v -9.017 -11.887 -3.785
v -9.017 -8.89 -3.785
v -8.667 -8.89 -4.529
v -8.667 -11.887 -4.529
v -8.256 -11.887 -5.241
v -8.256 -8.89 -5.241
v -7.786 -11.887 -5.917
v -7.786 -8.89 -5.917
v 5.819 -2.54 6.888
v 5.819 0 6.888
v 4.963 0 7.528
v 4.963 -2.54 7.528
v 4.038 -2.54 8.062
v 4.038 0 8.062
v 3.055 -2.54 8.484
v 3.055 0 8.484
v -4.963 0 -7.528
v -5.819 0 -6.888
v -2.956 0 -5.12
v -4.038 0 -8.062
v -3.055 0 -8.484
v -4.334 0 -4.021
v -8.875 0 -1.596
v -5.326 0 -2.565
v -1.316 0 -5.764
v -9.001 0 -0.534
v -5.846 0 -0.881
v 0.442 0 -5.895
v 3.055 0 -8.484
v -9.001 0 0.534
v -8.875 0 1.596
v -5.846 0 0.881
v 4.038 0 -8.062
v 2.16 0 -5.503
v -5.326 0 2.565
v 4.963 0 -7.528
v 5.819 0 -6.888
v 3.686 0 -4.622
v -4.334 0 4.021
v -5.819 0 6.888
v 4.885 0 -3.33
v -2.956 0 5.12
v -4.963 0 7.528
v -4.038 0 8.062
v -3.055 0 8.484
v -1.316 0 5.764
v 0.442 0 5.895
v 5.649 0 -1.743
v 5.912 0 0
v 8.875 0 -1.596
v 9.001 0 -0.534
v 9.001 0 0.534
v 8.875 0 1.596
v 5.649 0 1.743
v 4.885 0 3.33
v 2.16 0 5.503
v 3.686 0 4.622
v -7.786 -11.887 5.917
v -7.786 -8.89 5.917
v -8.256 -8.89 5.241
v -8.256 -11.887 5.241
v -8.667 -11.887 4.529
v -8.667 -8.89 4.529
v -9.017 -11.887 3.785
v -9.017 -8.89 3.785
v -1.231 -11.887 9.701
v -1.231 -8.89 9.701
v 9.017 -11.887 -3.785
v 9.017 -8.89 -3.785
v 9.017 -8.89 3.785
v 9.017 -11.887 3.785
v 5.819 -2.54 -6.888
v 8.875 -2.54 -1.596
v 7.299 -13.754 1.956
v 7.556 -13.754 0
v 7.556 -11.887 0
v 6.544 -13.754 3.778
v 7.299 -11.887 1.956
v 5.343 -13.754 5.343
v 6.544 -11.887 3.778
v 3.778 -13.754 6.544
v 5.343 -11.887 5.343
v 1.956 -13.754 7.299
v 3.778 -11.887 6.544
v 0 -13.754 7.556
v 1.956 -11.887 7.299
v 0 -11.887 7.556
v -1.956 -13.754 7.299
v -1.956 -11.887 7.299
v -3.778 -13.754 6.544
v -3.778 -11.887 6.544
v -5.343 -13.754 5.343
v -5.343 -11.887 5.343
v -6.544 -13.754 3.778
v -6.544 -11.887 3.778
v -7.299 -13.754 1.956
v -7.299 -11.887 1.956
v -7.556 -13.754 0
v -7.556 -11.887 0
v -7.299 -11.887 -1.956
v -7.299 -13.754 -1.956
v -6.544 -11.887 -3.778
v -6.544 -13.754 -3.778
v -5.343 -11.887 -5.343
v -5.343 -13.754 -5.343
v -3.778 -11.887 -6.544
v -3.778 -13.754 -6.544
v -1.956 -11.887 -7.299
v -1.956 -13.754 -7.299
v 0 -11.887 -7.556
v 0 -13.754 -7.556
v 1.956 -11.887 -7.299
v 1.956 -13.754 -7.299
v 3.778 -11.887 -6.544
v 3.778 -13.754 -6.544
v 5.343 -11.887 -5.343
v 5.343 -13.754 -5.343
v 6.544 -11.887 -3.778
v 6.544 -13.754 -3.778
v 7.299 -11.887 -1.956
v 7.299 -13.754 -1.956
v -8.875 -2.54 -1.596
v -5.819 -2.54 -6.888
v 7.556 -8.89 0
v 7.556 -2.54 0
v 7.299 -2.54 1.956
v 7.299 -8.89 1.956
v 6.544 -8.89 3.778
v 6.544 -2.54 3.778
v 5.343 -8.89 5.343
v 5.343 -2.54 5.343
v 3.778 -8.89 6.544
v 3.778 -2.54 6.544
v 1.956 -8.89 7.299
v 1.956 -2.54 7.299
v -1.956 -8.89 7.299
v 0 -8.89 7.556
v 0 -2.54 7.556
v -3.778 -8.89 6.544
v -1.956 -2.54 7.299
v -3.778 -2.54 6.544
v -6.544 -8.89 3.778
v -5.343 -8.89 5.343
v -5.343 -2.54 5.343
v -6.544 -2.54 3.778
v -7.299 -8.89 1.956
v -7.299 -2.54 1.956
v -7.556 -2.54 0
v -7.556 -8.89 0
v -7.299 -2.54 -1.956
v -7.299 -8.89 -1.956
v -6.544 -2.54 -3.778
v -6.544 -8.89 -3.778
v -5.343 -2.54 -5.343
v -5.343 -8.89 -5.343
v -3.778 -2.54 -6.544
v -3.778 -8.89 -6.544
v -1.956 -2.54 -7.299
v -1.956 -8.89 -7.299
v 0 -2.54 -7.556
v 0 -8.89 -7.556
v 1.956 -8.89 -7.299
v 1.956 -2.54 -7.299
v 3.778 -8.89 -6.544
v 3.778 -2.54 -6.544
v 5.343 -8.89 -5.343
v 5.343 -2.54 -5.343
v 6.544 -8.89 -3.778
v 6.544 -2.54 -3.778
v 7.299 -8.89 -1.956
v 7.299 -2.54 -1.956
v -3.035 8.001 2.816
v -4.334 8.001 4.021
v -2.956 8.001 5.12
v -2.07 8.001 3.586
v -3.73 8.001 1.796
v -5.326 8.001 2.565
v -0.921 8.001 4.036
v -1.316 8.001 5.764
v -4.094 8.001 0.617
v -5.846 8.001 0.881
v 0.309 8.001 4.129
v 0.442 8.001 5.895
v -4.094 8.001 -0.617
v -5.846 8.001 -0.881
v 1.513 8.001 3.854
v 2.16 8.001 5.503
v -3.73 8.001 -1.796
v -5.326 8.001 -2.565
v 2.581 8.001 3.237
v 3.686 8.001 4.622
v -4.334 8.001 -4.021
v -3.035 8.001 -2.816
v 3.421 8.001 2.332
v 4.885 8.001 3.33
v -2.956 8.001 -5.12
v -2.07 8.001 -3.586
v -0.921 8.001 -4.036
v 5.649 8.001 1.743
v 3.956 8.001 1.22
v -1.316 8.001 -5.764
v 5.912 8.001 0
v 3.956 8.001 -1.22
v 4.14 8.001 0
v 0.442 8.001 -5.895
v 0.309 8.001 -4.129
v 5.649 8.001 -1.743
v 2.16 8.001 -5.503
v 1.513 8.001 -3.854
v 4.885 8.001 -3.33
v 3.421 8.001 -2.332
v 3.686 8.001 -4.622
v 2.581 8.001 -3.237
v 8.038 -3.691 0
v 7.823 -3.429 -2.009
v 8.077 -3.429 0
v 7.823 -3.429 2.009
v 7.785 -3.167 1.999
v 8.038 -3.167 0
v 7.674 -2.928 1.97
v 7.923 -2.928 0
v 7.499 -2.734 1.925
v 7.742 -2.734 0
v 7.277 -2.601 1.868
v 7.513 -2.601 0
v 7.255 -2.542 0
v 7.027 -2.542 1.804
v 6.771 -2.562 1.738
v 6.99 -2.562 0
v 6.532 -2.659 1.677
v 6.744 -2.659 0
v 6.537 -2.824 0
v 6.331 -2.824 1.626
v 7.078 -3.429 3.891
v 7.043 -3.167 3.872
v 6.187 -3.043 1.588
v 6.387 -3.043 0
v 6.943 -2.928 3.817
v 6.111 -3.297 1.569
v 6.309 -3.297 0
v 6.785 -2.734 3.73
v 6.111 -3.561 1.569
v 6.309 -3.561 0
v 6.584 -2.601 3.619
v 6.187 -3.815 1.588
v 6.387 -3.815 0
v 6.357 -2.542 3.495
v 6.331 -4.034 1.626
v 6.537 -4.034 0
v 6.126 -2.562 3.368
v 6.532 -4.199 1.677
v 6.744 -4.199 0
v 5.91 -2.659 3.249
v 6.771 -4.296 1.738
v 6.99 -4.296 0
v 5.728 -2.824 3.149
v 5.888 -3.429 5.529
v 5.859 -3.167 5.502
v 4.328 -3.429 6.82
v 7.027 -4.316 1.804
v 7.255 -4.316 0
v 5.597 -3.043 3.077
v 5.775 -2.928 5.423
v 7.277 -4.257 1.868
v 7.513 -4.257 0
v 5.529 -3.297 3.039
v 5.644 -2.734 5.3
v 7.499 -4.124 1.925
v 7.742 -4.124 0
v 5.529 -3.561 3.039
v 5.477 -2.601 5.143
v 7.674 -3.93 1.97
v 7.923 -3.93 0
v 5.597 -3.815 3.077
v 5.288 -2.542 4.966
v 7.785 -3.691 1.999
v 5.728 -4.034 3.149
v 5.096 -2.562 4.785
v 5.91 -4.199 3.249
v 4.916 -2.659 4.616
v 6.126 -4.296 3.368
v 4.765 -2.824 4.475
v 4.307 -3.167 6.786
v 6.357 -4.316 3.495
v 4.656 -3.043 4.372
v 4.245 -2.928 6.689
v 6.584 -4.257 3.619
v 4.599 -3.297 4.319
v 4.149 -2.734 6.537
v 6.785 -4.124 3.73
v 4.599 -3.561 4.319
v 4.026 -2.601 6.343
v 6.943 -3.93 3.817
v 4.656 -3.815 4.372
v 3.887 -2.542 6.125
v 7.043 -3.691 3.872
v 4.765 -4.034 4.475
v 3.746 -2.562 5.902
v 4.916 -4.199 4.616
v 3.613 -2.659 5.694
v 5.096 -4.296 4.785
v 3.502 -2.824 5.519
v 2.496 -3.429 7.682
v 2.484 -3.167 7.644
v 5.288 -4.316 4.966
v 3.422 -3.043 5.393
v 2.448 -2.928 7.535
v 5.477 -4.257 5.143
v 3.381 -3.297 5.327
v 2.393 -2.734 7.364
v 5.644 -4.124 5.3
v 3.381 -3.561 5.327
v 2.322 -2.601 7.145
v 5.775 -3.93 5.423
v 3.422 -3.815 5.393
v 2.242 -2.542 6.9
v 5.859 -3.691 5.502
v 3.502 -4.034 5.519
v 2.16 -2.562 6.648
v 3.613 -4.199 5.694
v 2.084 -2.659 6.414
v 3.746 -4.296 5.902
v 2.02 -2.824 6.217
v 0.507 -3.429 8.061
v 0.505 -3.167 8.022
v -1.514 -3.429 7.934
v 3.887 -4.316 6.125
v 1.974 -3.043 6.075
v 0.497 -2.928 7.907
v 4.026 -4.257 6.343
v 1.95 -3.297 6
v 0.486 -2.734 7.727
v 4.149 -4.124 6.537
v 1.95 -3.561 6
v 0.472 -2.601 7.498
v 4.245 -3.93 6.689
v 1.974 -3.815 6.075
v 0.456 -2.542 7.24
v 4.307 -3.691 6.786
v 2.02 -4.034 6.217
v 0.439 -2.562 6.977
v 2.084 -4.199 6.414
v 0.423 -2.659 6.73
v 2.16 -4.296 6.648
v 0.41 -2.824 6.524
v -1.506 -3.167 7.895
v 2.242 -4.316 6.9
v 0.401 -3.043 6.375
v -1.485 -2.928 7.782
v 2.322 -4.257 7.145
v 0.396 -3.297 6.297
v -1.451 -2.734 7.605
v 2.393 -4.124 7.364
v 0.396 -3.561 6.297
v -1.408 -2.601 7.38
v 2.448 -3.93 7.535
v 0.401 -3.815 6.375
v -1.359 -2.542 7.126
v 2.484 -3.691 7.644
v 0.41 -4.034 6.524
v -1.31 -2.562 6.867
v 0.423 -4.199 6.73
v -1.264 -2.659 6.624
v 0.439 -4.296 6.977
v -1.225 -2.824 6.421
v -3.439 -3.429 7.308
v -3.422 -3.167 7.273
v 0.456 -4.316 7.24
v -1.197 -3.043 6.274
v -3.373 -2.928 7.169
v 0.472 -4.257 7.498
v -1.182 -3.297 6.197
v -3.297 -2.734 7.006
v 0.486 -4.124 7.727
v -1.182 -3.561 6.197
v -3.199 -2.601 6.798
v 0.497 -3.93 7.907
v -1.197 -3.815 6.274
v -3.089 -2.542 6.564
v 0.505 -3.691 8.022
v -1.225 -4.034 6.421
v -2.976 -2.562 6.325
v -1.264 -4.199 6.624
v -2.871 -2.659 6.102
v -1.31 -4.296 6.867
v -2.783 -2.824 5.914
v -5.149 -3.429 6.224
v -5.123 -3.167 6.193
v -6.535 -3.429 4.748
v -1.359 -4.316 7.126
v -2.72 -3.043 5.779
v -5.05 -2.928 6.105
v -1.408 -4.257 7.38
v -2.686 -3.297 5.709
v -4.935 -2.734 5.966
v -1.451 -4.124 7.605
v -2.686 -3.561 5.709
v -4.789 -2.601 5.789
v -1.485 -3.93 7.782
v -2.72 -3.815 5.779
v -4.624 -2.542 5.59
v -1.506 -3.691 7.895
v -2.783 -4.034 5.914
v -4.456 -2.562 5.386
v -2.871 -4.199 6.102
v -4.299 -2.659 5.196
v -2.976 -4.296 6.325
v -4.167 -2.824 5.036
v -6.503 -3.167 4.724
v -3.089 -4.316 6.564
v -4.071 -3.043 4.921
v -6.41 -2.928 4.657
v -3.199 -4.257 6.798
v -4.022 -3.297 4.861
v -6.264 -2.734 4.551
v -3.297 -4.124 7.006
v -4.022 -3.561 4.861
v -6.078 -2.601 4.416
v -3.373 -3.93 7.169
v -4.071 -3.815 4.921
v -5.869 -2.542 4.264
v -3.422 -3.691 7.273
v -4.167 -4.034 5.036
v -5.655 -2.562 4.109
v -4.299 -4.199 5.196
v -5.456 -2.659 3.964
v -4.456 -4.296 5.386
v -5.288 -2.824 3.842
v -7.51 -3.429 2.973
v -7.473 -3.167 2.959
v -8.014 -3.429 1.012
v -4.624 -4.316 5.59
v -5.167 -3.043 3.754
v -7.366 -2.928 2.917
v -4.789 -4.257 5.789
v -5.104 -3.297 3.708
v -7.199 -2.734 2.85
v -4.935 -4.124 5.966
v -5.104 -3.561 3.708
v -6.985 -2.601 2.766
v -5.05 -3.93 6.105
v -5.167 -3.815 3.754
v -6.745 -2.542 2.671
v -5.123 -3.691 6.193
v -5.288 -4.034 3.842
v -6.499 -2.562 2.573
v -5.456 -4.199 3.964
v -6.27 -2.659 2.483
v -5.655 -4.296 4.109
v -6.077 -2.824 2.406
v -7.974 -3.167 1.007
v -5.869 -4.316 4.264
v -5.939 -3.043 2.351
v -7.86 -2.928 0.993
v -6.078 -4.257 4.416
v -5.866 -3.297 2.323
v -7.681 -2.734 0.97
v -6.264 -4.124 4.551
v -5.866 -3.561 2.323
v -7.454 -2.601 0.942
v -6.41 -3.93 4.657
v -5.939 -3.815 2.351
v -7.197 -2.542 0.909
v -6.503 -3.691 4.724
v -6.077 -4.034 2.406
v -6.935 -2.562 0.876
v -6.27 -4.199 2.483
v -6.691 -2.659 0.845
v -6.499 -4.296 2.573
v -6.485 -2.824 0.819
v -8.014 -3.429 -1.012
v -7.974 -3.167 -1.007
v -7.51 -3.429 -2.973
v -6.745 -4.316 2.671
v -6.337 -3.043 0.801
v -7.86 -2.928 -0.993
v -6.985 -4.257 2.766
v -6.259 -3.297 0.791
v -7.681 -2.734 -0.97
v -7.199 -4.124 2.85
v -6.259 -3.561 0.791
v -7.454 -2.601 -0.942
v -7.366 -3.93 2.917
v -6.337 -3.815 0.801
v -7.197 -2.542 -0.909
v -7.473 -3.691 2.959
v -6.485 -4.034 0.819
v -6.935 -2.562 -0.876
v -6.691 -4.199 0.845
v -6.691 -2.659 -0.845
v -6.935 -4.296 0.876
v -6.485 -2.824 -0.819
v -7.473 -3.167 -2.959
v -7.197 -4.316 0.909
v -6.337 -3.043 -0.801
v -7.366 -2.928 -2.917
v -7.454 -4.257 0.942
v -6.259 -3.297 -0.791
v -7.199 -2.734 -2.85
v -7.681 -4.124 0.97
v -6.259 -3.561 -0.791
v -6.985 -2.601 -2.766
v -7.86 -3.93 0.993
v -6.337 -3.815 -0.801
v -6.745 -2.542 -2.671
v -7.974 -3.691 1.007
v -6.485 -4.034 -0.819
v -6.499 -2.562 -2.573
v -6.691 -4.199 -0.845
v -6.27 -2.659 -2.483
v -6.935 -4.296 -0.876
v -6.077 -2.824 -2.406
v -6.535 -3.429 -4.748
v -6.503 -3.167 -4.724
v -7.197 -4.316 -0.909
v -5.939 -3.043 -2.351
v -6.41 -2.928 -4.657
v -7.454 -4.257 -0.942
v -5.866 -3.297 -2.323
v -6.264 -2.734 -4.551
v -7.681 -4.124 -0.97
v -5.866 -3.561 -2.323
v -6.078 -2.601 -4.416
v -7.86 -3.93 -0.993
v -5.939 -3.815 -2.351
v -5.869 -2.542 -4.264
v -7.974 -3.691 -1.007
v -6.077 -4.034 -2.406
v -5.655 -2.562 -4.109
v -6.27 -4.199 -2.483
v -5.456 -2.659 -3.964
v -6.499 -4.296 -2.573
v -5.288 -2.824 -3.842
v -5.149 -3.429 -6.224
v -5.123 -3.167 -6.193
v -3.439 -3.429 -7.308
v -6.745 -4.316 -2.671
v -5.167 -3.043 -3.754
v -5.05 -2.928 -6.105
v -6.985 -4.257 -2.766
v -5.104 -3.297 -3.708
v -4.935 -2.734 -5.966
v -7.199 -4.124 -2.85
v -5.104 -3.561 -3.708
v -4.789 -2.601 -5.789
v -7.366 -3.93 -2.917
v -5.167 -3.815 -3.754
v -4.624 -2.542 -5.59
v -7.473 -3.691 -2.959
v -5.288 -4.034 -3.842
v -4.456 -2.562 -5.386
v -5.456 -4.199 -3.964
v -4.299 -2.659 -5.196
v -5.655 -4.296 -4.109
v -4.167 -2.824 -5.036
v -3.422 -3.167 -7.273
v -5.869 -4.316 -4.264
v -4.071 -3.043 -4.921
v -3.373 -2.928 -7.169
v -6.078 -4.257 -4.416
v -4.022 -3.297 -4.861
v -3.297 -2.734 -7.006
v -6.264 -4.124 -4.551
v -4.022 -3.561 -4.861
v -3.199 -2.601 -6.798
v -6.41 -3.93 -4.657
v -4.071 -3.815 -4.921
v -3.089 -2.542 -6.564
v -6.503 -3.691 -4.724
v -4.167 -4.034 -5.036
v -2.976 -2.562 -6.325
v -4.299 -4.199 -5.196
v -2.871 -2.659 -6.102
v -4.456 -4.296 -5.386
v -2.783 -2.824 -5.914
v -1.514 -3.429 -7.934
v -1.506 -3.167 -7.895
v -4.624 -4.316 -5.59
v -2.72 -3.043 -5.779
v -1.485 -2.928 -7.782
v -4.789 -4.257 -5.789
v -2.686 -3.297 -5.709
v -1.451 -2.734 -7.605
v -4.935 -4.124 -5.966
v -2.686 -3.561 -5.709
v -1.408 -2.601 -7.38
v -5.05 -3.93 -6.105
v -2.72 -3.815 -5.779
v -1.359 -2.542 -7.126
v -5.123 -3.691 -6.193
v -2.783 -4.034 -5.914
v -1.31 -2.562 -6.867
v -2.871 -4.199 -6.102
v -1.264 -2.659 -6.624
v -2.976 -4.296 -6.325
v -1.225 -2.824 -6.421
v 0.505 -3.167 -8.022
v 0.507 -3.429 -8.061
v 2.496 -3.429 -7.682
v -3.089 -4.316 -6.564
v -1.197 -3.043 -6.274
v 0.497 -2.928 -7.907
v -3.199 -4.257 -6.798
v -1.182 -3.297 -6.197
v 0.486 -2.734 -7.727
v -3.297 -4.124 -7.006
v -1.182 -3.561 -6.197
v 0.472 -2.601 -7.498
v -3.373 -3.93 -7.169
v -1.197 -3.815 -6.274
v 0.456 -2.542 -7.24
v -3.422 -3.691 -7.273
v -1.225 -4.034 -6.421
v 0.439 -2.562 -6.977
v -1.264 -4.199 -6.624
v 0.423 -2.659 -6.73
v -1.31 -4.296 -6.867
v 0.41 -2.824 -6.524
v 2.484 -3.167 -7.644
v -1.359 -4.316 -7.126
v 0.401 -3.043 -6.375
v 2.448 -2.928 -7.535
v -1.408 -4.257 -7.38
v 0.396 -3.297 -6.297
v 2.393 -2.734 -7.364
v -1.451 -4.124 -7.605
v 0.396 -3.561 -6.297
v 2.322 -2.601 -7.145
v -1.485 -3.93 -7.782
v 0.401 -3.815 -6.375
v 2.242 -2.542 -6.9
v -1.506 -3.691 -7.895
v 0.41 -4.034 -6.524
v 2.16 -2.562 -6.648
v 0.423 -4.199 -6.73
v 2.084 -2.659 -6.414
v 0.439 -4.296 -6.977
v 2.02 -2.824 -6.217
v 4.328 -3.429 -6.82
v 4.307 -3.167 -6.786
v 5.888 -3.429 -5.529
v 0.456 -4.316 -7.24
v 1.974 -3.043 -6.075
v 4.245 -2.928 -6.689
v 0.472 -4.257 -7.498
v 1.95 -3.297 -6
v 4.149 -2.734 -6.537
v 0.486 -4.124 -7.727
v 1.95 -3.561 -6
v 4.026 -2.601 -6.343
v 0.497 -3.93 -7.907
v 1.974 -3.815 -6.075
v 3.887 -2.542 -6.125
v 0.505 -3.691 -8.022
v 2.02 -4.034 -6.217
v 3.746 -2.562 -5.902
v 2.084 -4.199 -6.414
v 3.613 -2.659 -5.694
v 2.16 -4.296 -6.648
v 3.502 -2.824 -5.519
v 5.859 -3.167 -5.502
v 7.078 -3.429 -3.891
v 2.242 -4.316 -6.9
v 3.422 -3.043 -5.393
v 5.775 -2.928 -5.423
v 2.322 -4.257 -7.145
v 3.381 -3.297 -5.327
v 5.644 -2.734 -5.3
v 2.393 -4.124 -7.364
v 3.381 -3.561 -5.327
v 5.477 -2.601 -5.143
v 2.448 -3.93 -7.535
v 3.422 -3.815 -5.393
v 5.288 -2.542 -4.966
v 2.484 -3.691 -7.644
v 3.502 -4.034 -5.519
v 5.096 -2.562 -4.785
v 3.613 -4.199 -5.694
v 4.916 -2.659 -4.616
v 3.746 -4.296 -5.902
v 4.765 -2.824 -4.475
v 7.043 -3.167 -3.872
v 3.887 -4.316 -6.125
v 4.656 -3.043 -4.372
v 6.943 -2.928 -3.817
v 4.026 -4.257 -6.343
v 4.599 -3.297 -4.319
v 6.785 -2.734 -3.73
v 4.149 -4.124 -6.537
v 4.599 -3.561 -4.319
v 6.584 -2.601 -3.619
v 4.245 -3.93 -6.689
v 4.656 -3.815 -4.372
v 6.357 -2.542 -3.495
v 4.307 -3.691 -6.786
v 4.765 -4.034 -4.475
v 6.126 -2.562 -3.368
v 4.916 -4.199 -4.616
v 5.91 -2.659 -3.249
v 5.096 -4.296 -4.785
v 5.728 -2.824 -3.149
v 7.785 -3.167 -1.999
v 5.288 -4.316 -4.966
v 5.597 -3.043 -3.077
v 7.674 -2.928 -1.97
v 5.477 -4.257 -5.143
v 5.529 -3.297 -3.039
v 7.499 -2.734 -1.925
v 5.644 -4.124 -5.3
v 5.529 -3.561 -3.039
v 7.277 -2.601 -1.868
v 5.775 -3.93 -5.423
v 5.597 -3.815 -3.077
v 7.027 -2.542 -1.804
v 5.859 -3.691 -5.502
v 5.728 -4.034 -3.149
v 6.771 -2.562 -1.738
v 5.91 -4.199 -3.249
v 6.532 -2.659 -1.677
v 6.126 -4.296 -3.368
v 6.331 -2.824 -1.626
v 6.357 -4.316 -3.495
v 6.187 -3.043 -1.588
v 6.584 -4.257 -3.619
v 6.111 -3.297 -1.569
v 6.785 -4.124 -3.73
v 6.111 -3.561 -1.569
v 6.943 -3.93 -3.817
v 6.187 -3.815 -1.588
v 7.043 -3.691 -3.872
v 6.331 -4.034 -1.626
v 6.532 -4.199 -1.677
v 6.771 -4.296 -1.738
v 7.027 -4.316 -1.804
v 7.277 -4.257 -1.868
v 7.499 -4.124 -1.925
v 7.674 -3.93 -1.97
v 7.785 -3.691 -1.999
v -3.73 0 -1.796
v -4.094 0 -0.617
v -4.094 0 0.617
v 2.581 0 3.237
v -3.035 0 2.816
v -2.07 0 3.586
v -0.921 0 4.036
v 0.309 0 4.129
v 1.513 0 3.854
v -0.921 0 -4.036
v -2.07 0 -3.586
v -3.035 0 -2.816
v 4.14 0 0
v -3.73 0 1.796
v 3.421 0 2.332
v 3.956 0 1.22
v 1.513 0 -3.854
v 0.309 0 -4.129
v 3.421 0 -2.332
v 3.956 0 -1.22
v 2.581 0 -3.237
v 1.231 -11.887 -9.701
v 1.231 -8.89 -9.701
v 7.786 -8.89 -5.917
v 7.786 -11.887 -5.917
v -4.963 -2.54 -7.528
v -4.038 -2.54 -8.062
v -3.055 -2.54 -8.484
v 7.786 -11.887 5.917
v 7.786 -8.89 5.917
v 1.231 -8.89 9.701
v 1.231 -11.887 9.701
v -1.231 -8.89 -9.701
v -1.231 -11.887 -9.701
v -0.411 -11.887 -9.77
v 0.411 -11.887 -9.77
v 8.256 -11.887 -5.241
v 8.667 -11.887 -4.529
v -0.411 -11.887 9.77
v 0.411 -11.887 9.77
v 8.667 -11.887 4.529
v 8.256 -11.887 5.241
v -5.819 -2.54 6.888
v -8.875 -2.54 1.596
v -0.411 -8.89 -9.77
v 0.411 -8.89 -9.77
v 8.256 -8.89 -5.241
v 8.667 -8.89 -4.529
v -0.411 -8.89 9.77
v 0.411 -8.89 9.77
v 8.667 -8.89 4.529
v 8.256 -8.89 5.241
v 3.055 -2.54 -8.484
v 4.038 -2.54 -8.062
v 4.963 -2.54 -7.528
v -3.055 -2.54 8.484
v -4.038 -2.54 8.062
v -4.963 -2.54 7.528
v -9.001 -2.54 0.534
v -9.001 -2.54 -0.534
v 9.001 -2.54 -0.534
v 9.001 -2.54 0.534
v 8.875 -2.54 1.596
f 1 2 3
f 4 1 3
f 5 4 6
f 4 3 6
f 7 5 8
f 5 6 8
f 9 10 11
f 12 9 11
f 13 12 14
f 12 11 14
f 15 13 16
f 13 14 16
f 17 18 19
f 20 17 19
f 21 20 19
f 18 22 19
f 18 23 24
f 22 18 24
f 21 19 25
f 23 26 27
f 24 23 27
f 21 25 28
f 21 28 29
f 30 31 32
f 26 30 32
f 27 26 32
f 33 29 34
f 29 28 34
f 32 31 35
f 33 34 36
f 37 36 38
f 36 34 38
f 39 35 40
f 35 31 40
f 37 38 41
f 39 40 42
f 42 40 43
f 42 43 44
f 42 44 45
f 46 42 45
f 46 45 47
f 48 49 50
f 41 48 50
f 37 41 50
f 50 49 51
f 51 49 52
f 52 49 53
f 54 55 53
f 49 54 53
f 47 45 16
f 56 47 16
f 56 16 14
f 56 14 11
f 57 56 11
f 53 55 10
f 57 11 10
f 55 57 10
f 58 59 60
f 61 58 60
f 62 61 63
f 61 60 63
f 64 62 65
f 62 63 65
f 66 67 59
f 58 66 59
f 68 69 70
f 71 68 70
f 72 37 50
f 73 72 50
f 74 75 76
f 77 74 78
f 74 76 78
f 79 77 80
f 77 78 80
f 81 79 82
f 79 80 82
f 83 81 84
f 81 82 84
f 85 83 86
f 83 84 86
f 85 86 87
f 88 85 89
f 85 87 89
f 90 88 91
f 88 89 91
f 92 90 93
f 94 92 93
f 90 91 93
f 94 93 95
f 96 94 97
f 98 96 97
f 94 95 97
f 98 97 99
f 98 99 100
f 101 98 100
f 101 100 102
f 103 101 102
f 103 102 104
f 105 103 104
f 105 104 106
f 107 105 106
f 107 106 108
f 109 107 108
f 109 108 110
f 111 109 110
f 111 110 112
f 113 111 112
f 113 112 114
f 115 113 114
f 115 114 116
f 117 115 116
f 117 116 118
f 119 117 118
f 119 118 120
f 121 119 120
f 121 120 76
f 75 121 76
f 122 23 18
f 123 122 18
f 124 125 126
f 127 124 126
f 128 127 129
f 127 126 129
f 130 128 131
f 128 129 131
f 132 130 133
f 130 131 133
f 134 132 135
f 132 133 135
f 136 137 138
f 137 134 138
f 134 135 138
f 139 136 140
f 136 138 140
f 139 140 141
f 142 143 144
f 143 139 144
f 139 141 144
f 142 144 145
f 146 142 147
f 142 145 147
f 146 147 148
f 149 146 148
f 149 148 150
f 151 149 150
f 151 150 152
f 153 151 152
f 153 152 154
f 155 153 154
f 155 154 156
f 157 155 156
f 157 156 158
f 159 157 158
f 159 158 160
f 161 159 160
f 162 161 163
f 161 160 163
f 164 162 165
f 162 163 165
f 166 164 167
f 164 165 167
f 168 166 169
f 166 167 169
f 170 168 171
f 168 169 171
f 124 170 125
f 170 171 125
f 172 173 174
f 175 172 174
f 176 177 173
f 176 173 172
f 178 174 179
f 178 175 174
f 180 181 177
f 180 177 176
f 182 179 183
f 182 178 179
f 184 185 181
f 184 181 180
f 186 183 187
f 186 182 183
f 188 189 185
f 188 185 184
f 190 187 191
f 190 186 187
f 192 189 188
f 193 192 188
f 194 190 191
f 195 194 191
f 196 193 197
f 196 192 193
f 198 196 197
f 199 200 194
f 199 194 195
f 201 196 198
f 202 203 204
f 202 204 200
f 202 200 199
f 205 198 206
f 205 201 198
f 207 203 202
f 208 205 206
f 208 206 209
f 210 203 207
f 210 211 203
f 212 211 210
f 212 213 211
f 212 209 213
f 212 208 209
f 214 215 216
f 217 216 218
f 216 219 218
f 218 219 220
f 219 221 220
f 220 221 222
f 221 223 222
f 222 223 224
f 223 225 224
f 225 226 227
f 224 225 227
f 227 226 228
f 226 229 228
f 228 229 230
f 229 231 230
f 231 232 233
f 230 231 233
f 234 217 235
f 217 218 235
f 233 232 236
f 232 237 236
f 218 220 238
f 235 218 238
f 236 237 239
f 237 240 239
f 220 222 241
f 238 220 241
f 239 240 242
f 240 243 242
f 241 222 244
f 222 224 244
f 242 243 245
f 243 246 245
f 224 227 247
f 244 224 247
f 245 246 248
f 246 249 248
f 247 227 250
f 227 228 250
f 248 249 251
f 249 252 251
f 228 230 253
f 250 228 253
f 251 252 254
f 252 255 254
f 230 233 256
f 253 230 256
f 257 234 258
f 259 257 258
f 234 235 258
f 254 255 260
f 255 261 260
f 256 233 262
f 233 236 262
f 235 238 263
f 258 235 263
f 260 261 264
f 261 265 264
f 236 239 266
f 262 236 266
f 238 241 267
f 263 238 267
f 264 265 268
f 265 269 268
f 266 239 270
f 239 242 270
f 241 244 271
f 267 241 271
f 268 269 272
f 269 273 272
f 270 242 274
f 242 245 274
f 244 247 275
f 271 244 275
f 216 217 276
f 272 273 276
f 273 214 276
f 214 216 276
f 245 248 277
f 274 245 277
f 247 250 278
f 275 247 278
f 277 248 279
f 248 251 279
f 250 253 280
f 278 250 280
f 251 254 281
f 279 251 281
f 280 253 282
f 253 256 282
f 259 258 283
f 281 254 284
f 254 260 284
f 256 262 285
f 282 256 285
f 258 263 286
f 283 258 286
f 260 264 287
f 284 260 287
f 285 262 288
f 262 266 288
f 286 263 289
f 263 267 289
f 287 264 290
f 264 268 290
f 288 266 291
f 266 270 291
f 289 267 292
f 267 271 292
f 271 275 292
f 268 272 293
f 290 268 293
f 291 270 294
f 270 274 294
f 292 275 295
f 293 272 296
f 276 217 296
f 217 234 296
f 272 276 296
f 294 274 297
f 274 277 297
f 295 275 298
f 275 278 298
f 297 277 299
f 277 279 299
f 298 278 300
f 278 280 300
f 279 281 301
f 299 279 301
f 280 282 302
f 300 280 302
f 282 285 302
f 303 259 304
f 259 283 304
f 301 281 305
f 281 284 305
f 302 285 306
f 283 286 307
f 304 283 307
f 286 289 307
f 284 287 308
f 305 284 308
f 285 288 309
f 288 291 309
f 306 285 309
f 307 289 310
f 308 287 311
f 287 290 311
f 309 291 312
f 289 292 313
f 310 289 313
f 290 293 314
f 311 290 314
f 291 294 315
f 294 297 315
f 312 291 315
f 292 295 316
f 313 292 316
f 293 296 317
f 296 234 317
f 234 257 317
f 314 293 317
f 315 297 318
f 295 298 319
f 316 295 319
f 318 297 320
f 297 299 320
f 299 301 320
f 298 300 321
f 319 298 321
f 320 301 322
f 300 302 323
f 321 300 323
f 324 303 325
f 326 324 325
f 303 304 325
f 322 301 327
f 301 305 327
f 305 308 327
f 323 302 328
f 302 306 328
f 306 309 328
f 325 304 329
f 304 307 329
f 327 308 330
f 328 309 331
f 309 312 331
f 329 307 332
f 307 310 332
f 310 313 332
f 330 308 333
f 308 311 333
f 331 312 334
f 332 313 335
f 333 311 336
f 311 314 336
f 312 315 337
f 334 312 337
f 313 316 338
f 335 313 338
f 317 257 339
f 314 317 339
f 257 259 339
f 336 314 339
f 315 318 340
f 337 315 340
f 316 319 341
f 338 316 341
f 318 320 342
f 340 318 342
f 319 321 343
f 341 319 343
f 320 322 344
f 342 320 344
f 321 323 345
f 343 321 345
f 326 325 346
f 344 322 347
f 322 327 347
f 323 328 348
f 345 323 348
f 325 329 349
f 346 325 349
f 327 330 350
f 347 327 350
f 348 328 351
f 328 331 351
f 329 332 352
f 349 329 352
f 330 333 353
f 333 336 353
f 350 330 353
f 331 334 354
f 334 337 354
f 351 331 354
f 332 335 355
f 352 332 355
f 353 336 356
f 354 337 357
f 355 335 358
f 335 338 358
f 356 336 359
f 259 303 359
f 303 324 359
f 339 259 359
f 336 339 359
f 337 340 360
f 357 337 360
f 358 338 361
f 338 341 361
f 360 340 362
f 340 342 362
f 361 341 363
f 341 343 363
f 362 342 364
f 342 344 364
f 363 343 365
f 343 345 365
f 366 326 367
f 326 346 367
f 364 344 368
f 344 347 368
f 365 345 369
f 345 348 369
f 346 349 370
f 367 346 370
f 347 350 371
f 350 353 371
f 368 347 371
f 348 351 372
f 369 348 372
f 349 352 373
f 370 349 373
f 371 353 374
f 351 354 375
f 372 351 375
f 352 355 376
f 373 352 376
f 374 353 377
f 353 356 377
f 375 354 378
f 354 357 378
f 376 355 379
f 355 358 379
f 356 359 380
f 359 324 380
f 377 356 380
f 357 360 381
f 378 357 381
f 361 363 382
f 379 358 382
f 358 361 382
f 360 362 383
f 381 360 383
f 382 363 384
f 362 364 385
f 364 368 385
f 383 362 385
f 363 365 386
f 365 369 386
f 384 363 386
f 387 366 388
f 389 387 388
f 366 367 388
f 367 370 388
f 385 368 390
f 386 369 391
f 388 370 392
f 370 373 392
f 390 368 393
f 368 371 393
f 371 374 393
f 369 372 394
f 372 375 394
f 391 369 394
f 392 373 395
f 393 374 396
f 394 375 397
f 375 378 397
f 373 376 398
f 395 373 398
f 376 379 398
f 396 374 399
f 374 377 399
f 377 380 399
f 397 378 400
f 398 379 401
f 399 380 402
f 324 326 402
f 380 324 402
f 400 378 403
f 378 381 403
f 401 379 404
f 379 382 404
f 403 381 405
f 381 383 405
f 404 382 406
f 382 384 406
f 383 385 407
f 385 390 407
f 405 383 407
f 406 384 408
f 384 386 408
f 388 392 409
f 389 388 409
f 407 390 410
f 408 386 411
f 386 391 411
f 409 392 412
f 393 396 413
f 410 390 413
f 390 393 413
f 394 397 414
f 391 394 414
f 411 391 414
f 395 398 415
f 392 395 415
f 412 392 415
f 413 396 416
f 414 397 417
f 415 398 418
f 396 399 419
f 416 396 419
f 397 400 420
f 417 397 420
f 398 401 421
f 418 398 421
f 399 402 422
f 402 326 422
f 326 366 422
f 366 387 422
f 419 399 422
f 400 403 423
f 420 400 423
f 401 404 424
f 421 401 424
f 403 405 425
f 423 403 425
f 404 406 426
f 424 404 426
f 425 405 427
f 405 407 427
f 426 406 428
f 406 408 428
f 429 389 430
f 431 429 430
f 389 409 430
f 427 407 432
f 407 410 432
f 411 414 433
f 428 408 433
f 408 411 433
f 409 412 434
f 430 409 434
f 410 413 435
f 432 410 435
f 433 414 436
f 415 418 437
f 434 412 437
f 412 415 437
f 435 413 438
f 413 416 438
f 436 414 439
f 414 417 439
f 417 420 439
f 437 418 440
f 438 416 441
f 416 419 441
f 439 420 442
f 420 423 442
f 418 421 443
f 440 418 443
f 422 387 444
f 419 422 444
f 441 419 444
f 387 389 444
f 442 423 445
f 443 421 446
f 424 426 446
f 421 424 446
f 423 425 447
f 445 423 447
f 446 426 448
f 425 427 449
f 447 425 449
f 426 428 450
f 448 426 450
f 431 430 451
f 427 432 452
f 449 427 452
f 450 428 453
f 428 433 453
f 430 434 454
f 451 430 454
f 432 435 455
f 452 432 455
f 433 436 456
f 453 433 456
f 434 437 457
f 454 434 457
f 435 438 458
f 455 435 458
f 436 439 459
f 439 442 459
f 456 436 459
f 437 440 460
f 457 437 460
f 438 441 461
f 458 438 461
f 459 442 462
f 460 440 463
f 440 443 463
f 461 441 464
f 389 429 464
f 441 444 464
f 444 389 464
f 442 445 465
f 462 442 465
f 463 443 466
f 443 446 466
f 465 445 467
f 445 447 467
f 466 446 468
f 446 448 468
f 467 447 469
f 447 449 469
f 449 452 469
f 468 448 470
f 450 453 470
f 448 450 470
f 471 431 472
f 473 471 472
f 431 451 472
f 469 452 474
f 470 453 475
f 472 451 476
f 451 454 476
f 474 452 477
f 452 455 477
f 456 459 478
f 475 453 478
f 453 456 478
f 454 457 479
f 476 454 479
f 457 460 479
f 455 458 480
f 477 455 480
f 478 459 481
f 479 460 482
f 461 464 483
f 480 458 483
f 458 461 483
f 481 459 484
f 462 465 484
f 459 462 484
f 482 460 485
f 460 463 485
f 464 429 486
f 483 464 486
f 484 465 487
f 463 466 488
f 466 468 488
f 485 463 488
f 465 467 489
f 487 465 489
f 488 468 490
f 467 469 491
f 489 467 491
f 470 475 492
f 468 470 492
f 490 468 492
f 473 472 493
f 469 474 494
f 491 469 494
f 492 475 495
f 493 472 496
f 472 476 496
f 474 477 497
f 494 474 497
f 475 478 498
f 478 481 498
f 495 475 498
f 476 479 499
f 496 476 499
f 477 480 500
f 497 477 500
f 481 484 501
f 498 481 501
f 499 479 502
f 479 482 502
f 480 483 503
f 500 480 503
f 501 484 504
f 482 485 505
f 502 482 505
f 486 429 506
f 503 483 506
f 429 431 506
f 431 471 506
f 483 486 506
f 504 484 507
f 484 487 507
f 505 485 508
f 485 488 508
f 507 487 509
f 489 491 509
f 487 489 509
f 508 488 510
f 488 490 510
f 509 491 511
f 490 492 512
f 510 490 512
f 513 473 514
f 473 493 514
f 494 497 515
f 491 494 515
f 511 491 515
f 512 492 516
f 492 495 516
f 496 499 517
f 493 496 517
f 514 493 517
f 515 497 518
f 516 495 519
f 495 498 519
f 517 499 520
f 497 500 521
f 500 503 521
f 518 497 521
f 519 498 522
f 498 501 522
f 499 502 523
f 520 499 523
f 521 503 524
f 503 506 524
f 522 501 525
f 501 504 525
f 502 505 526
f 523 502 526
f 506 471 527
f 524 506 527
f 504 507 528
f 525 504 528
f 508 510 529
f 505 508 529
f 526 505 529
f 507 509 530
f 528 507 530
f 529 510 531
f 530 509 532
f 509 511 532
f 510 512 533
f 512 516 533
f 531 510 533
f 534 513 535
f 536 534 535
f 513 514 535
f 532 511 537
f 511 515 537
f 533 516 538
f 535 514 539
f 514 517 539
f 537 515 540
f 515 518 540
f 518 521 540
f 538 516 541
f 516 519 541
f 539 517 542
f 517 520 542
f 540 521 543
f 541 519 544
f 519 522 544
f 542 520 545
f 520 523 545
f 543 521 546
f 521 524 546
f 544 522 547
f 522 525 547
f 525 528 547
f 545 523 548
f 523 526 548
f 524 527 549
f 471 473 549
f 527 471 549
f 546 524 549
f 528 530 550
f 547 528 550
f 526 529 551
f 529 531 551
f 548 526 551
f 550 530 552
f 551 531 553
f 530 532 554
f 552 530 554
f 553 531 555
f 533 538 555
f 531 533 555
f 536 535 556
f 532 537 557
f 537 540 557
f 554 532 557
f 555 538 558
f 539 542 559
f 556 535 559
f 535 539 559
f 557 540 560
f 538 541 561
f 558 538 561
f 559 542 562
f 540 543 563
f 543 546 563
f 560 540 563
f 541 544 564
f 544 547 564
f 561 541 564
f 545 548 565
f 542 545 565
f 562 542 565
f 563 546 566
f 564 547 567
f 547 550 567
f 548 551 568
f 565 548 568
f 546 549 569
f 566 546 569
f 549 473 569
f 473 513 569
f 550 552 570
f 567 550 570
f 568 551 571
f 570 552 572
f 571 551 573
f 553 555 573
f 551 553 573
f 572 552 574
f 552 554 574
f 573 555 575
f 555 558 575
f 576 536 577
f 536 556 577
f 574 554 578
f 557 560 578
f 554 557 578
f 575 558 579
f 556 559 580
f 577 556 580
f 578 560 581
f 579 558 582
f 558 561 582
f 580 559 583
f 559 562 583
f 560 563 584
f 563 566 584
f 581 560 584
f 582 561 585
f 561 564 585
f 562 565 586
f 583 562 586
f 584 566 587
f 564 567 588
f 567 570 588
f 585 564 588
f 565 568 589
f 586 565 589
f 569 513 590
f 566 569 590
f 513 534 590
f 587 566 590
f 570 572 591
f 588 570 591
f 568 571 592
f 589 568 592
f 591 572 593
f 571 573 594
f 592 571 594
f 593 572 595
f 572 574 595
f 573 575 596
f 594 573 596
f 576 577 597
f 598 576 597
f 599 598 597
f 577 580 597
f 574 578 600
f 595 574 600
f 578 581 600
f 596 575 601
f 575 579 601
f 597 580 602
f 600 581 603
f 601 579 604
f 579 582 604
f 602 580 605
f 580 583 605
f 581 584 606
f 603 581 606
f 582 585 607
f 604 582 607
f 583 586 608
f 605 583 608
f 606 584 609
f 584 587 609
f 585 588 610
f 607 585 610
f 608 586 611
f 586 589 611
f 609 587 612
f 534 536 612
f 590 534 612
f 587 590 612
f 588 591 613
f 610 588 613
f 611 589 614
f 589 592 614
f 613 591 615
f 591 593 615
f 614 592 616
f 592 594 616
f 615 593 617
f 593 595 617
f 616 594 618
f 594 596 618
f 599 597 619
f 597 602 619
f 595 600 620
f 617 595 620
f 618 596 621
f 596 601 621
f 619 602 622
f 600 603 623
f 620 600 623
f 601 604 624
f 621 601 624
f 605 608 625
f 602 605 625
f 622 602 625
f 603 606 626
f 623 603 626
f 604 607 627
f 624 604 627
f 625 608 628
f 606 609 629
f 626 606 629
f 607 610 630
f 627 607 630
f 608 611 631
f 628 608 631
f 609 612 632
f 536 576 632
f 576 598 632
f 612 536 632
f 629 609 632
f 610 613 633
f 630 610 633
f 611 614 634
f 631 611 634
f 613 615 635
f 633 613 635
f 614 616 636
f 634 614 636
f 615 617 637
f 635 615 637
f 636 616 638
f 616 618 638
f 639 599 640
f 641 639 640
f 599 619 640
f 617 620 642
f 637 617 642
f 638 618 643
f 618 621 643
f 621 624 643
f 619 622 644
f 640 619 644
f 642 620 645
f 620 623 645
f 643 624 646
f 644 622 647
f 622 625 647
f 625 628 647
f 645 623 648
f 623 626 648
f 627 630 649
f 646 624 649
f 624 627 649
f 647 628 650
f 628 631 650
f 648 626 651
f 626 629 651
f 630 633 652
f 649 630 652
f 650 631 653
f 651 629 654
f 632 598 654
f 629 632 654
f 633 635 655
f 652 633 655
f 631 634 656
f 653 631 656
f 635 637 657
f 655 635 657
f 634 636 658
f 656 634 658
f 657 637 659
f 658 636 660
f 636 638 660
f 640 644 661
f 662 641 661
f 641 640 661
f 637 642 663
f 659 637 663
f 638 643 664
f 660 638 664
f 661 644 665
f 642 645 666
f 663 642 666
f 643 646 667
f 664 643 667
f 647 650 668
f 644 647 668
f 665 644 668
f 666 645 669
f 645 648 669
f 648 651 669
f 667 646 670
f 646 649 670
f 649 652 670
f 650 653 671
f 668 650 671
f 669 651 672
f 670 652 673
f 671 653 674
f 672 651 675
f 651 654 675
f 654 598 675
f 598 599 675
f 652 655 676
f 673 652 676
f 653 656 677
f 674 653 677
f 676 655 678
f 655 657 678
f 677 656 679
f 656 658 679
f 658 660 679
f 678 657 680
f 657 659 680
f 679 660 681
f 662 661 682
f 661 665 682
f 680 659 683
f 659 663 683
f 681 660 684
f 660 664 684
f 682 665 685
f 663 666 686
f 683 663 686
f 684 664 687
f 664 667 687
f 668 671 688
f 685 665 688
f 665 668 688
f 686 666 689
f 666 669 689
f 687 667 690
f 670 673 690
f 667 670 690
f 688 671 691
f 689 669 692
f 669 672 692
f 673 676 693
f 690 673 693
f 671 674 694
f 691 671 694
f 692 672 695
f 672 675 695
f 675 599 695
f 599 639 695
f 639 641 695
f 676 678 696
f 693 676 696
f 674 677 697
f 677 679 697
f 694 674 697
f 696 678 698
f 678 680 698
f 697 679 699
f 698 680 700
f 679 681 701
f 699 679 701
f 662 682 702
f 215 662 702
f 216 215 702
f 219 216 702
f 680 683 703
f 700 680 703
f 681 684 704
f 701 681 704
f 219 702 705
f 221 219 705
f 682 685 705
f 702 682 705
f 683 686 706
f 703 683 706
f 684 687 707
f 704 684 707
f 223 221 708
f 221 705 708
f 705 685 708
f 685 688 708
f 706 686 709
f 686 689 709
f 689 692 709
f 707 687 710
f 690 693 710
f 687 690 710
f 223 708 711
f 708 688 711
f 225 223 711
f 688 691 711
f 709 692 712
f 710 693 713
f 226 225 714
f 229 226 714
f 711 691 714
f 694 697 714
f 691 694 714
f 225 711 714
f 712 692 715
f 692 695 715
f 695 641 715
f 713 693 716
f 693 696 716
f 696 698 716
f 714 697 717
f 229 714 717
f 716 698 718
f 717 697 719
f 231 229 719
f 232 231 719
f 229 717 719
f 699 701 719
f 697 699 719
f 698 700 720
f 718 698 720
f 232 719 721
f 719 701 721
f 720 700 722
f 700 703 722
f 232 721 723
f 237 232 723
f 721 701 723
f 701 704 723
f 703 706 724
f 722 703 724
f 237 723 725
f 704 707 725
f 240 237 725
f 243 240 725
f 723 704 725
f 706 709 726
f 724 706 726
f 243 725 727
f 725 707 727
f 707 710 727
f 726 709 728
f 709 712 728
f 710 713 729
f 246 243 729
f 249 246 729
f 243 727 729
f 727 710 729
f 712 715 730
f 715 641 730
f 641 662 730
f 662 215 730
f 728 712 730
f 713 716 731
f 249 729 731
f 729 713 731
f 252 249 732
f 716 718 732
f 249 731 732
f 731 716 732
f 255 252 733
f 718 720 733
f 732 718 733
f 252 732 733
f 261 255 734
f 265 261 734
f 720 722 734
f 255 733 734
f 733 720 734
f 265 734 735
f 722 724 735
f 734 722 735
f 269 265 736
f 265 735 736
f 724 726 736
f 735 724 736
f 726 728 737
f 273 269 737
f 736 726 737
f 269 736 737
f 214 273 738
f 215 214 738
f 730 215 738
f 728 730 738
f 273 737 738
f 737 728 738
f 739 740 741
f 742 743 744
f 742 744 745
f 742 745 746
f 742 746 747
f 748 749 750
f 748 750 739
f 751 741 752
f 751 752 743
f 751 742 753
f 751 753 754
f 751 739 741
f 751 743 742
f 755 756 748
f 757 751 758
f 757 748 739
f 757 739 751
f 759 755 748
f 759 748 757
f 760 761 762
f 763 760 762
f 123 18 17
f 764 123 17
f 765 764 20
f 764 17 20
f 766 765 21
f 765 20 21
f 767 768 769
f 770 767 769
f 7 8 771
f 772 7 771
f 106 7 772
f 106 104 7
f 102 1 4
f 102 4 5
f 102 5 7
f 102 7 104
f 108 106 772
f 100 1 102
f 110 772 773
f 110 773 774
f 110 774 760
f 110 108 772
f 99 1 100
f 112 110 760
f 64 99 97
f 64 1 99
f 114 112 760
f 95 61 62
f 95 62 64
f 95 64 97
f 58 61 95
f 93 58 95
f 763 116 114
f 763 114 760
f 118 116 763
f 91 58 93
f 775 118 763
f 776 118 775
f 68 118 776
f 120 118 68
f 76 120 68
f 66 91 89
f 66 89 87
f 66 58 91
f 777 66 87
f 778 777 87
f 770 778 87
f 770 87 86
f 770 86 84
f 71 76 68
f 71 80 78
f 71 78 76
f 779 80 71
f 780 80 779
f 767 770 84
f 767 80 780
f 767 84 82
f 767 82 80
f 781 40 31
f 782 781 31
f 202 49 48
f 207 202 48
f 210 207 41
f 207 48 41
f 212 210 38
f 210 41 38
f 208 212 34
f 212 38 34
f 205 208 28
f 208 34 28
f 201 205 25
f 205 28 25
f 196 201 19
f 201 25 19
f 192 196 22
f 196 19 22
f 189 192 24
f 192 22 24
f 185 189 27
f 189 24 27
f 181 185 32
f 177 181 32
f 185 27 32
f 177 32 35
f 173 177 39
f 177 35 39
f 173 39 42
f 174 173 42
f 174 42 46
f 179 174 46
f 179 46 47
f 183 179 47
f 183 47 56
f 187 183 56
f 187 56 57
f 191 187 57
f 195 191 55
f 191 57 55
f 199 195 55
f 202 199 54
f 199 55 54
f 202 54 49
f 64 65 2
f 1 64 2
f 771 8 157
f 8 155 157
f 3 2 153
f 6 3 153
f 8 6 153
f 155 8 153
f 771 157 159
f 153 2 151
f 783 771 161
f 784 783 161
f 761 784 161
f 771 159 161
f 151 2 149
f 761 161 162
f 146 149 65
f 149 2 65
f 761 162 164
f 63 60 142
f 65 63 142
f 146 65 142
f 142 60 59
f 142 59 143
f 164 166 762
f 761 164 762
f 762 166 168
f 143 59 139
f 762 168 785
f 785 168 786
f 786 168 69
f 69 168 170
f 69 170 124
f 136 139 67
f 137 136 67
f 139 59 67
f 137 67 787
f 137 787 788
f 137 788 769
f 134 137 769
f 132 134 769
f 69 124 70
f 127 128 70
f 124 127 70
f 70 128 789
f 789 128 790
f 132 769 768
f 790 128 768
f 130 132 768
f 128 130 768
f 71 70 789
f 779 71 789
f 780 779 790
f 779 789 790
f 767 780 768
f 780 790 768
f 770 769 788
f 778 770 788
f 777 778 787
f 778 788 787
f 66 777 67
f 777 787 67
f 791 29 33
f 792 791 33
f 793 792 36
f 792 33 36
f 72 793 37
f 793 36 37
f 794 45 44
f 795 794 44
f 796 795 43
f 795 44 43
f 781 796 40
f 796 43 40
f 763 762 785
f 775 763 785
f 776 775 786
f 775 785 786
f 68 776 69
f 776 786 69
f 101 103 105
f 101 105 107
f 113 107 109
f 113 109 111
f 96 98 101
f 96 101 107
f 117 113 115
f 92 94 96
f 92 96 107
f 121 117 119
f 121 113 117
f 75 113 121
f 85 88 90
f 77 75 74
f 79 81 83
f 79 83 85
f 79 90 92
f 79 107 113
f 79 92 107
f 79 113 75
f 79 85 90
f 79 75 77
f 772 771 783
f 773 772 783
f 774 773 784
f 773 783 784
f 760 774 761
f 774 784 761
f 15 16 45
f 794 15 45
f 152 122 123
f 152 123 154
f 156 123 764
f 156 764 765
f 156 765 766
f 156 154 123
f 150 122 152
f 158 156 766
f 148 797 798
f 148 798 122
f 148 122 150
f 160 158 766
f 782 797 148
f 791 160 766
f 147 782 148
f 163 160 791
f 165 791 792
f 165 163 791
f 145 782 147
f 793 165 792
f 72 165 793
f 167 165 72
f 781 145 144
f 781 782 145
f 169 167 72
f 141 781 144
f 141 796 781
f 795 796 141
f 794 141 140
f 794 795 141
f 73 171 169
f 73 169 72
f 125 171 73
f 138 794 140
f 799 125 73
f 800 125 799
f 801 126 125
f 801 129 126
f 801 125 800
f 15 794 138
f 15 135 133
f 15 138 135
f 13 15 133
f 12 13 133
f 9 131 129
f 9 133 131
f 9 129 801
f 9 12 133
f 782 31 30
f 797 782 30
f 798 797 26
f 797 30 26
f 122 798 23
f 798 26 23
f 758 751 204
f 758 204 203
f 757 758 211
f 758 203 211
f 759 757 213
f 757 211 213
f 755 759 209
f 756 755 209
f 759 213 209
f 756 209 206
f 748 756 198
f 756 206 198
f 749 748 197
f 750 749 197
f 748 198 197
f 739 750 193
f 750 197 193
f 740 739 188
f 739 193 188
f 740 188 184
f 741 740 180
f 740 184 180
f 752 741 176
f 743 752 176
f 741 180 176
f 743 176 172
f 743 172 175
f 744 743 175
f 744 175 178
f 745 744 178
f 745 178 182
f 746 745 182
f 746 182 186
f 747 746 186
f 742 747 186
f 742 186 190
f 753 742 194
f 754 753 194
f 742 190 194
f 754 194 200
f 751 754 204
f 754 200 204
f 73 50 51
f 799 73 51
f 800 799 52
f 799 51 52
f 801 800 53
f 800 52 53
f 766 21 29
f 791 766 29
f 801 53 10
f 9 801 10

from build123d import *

# Parameters (mm, degrees)
SKETCH2_R           = 5.91185
BOSS_EXTRUDE1_DEPTH = 8.001
SKETCH3_R           = 9.017
BOSS_EXTRUDE2_DEPTH = 2.54
CUT_EXTRUDE1_DEPTH  = 2.54
SKETCH5_R           = 7.5565
BOSS_EXTRUDE3_DEPTH = 11.2141
SKETCH6_R           = 0.889
BOSS_EXTRUDE4_START = 6.35
BOSS_EXTRUDE4_DEPTH = 2.9972
SKETCH8_R           = 4.1402
CUT_EXTRUDE2_DEPTH  = 8.001


with BuildPart() as part:
    # Sketch2 → Boss-Extrude1 (new body)
    with BuildSketch(Plane(origin=(0, 0, 0), x_dir=(1, 0, 0), z_dir=(0, 1, 0))):
        Circle(SKETCH2_R)
    extrude(amount=BOSS_EXTRUDE1_DEPTH)

    # Sketch3 → Boss-Extrude2 (add)
    with BuildSketch(Plane.XZ):
        Circle(SKETCH3_R)
    extrude(amount=BOSS_EXTRUDE2_DEPTH)

    # Sketch4 → Cut-Extrude1 (cut)
    with BuildSketch(Plane(origin=(0, 0, 0), x_dir=(1, 0, 0), z_dir=(0, 1, 0))):
        with BuildLine():
            Line((-3.055293773, 8.4836), (3.055293773, 8.4836))
            ThreePointArc((3.055293773, 8.4836), (0, 9.017), (-3.055293773, 8.4836))
        make_face()
        with BuildLine():
            ThreePointArc((8.874660002, 1.595837976), (7.808951066, 4.5085), (5.819366229, 6.887762024))
            Line((5.819366229, 6.887762024), (8.874660002, 1.595837976))
        make_face()
        with BuildLine():
            Line((-8.874660002, 1.595837976), (-5.819366229, 6.887762024))
            ThreePointArc((-5.819366229, 6.887762024), (-7.808951066, 4.5085), (-8.874660002, 1.595837976))
        make_face()
        with BuildLine():
            ThreePointArc((5.819366229, -6.887762024), (7.808951066, -4.5085), (8.874660002, -1.595837976))
            Line((8.874660002, -1.595837976), (5.819366229, -6.887762024))
        make_face()
        with BuildLine():
            Line((-5.819366229, -6.887762024), (-8.874660002, -1.595837976))
            ThreePointArc((-8.874660002, -1.595837976), (-7.808951066, -4.5085), (-5.819366229, -6.887762024))
        make_face()
        with BuildLine():
            ThreePointArc((-3.055293773, -8.4836), (0, -9.017), (3.055293773, -8.4836))
            Line((3.055293773, -8.4836), (-3.055293773, -8.4836))
        make_face()
    extrude(amount=-CUT_EXTRUDE1_DEPTH, mode=Mode.SUBTRACT)

    # Sketch5 → Boss-Extrude3 (add)
    with BuildSketch(Plane.XZ.offset(2.54)):
        Circle(SKETCH5_R)
    extrude(amount=BOSS_EXTRUDE3_DEPTH)

    # Sketch7 → Boss-Extrude4 (add)
    with BuildSketch(Plane.XZ.offset(2.54).offset(BOSS_EXTRUDE4_START)):
        with BuildLine():
            Line((9.017, -3.784514764), (9.017, 3.784514764))
            ThreePointArc((9.017, 3.784514764), (8.468862424, 4.8895), (7.785985927, 5.916693684))
            Line((7.785985927, 5.916693684), (1.231014073, 9.701208448))
            ThreePointArc((1.231014073, 9.701208448), (0, 9.779), (-1.231014073, 9.701208448))
            Line((-1.231014073, 9.701208448), (-7.785985927, 5.916693684))
            ThreePointArc((-7.785985927, 5.916693684), (-8.468862424, 4.8895), (-9.017, 3.784514764))
            Line((-9.017, 3.784514764), (-9.017, -3.784514764))
            ThreePointArc((-9.017, -3.784514764), (-8.468862424, -4.8895), (-7.785985927, -5.916693684))
            Line((-7.785985927, -5.916693684), (-1.231014073, -9.701208448))
            ThreePointArc((-1.231014073, -9.701208448), (0, -9.779), (1.231014073, -9.701208448))
            Line((1.231014073, -9.701208448), (7.785985927, -5.916693684))
            ThreePointArc((7.785985927, -5.916693684), (8.468862424, -4.8895), (9.017, -3.784514764))
        make_face()
    extrude(amount=BOSS_EXTRUDE4_DEPTH)

    # Sketch8 → Cut-Extrude2 (cut)
    with BuildSketch(Plane(origin=(0, 8.001, 0), x_dir=(1, 0, 0), z_dir=(0, 1, 0))):
        Circle(SKETCH8_R)
    extrude(amount=-CUT_EXTRUDE2_DEPTH, mode=Mode.SUBTRACT)


with BuildPart() as body_2:
    # Sketch6 → Revolve1 (revolve)
    with BuildSketch(Plane.XY):
        with Locations((7.1882, -3.429)):
            Circle(SKETCH6_R)
    revolve(axis=Axis((0, 0, 0), (0, -1, 0)))


solid = Compound([part.part, body_2.part])
